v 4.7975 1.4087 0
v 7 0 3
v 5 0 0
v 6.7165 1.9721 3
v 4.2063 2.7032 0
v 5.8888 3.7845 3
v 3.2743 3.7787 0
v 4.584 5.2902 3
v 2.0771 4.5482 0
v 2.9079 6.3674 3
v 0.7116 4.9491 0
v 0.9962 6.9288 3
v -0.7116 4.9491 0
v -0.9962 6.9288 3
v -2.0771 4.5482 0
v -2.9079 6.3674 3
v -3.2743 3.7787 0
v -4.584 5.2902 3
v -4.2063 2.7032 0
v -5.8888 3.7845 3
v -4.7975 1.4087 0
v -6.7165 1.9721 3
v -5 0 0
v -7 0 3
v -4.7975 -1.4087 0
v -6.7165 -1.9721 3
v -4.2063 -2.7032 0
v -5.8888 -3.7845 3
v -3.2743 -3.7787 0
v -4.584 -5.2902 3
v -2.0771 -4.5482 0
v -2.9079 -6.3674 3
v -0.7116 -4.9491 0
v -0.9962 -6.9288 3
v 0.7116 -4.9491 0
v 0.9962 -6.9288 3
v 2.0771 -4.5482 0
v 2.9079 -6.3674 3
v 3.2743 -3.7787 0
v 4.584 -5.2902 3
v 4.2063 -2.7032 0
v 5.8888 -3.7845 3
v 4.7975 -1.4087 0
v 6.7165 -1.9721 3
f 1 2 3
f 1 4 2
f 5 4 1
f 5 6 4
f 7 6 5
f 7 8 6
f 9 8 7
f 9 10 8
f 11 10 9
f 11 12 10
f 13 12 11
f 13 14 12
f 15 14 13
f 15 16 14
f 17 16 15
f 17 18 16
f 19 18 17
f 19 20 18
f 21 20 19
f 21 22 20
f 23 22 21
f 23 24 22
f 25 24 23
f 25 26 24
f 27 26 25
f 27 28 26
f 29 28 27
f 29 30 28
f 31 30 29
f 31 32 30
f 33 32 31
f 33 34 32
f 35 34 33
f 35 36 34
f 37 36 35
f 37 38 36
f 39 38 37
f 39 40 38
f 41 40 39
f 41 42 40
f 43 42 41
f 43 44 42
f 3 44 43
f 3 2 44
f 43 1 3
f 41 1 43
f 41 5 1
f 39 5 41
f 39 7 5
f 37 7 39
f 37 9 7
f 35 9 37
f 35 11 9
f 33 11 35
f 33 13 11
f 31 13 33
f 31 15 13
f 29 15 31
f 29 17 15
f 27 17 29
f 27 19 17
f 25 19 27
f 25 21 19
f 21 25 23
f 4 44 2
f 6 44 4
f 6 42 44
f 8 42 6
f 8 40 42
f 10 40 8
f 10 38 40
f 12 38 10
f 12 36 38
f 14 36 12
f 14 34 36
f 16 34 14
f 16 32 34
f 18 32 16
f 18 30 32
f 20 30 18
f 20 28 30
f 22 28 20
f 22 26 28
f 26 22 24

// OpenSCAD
// Generated by SolidPython 1.0.1 on 2020-07-28 23:56:47


cylinder(h = 3, r1 = 5, r2 = 7);
/***********************************************
*********      SolidPython code:      **********
************************************************
 
# import packages: SolidPython
from solid import *
from solid.utils import *
from itertools import chain, combinations


class Resize:

    def __init__(self, scad_file):
        self.scad_file = scad_file
        #self.scad_file = import_scad(scad_file)
        # cone/cylinder param:
        self.r1 = 0
        self.r2 = 0
        self.h = 0
        # rectangular prism param:
        self.w = 0
        self.l = 0
        # ellipse param:
        self.r = 0

    # import OpenScad code (file name corresponds to shape)


    # classify shape + parameters
    def assign(self, param1, param2, param3):
        if self.scad_file == 'cone.scad':
            self.r1 = param1
            self.r2 = param2
            self.h = param3
        elif self.scad_file == 'cylinder.scad':
            self.r1 = param1
            self.r2 = param2
            self.h = param3
        elif self.scad_file == 'rectangularPrism.scad':
            self.h = param1
            self.l = param2
            self.w = param3
        else:
            self.r = param1
            self.h = param2

    # resize parameters
    def iterate(self):
        x = range(3, 20, 2)
        i = 1
        if self.scad_file == 'cone.scad':
            tempList = list(combinations(x, 3))
            print(tempList)
            for i in range(0, 3):
                param1 = tempList[i][0]
                param2 = tempList[i][1]
                param3 = tempList[i][2]
                filepath = 'produced_scad_files/' + 'cone' + str(param1) + '_' + str(param2) + '_' + str(param3) + '.scad'
                scad_render_to_file(cylinder(h=param1, r1=param2, r2=param3), filepath)

        elif self.scad_file == 'cylinder.scad':
            tempList = list(combinations(x, 3))
            for i in range(0, 3):
                param1 = tempList[i][0]
                param2 = tempList[i][1]
                param3 = tempList[i][2]
                filepath = 'produced_scad_files/' + 'cylinder' + str(param1) + '_' + str(param2) + '_' + str(param3) + '.scad'
                scad_render_to_file(cylinder(h=param1, r1=param2, r2=param3), filepath)

        elif self.scad_file == 'rectangularPrism.scad':
            tempList = list(combinations(x, 3))
            for i in range(0, 3):
                param1 = tempList[i][0]
                param2 = tempList[i][1]
                param3 = tempList[i][2]
                filepath = 'produced_scad_files/' + 'rectangularPrism' + str(param1) + '_' + str(param2) + '_' + str(
                    param3) + '.scad'
                scad_render_to_file(cube(size=(param1, param2, param3)), filepath)

        else:
            tempList = list(combinations(x, 2))
            for i in range(0, 2):
                param1 = tempList[i][0]
                param2 = tempList[i][1]
                filepath = 'produced_scad_files/' + 'ellipse' + str(param1) + '_' + str(param2) + '_' + '.scad'
                scad_render_to_file(sphere(param1, param2), filepath)

    def render_to_scadfile(self):
        scad_render_to_file(scad, 'example.scad') 
 
************************************************/
